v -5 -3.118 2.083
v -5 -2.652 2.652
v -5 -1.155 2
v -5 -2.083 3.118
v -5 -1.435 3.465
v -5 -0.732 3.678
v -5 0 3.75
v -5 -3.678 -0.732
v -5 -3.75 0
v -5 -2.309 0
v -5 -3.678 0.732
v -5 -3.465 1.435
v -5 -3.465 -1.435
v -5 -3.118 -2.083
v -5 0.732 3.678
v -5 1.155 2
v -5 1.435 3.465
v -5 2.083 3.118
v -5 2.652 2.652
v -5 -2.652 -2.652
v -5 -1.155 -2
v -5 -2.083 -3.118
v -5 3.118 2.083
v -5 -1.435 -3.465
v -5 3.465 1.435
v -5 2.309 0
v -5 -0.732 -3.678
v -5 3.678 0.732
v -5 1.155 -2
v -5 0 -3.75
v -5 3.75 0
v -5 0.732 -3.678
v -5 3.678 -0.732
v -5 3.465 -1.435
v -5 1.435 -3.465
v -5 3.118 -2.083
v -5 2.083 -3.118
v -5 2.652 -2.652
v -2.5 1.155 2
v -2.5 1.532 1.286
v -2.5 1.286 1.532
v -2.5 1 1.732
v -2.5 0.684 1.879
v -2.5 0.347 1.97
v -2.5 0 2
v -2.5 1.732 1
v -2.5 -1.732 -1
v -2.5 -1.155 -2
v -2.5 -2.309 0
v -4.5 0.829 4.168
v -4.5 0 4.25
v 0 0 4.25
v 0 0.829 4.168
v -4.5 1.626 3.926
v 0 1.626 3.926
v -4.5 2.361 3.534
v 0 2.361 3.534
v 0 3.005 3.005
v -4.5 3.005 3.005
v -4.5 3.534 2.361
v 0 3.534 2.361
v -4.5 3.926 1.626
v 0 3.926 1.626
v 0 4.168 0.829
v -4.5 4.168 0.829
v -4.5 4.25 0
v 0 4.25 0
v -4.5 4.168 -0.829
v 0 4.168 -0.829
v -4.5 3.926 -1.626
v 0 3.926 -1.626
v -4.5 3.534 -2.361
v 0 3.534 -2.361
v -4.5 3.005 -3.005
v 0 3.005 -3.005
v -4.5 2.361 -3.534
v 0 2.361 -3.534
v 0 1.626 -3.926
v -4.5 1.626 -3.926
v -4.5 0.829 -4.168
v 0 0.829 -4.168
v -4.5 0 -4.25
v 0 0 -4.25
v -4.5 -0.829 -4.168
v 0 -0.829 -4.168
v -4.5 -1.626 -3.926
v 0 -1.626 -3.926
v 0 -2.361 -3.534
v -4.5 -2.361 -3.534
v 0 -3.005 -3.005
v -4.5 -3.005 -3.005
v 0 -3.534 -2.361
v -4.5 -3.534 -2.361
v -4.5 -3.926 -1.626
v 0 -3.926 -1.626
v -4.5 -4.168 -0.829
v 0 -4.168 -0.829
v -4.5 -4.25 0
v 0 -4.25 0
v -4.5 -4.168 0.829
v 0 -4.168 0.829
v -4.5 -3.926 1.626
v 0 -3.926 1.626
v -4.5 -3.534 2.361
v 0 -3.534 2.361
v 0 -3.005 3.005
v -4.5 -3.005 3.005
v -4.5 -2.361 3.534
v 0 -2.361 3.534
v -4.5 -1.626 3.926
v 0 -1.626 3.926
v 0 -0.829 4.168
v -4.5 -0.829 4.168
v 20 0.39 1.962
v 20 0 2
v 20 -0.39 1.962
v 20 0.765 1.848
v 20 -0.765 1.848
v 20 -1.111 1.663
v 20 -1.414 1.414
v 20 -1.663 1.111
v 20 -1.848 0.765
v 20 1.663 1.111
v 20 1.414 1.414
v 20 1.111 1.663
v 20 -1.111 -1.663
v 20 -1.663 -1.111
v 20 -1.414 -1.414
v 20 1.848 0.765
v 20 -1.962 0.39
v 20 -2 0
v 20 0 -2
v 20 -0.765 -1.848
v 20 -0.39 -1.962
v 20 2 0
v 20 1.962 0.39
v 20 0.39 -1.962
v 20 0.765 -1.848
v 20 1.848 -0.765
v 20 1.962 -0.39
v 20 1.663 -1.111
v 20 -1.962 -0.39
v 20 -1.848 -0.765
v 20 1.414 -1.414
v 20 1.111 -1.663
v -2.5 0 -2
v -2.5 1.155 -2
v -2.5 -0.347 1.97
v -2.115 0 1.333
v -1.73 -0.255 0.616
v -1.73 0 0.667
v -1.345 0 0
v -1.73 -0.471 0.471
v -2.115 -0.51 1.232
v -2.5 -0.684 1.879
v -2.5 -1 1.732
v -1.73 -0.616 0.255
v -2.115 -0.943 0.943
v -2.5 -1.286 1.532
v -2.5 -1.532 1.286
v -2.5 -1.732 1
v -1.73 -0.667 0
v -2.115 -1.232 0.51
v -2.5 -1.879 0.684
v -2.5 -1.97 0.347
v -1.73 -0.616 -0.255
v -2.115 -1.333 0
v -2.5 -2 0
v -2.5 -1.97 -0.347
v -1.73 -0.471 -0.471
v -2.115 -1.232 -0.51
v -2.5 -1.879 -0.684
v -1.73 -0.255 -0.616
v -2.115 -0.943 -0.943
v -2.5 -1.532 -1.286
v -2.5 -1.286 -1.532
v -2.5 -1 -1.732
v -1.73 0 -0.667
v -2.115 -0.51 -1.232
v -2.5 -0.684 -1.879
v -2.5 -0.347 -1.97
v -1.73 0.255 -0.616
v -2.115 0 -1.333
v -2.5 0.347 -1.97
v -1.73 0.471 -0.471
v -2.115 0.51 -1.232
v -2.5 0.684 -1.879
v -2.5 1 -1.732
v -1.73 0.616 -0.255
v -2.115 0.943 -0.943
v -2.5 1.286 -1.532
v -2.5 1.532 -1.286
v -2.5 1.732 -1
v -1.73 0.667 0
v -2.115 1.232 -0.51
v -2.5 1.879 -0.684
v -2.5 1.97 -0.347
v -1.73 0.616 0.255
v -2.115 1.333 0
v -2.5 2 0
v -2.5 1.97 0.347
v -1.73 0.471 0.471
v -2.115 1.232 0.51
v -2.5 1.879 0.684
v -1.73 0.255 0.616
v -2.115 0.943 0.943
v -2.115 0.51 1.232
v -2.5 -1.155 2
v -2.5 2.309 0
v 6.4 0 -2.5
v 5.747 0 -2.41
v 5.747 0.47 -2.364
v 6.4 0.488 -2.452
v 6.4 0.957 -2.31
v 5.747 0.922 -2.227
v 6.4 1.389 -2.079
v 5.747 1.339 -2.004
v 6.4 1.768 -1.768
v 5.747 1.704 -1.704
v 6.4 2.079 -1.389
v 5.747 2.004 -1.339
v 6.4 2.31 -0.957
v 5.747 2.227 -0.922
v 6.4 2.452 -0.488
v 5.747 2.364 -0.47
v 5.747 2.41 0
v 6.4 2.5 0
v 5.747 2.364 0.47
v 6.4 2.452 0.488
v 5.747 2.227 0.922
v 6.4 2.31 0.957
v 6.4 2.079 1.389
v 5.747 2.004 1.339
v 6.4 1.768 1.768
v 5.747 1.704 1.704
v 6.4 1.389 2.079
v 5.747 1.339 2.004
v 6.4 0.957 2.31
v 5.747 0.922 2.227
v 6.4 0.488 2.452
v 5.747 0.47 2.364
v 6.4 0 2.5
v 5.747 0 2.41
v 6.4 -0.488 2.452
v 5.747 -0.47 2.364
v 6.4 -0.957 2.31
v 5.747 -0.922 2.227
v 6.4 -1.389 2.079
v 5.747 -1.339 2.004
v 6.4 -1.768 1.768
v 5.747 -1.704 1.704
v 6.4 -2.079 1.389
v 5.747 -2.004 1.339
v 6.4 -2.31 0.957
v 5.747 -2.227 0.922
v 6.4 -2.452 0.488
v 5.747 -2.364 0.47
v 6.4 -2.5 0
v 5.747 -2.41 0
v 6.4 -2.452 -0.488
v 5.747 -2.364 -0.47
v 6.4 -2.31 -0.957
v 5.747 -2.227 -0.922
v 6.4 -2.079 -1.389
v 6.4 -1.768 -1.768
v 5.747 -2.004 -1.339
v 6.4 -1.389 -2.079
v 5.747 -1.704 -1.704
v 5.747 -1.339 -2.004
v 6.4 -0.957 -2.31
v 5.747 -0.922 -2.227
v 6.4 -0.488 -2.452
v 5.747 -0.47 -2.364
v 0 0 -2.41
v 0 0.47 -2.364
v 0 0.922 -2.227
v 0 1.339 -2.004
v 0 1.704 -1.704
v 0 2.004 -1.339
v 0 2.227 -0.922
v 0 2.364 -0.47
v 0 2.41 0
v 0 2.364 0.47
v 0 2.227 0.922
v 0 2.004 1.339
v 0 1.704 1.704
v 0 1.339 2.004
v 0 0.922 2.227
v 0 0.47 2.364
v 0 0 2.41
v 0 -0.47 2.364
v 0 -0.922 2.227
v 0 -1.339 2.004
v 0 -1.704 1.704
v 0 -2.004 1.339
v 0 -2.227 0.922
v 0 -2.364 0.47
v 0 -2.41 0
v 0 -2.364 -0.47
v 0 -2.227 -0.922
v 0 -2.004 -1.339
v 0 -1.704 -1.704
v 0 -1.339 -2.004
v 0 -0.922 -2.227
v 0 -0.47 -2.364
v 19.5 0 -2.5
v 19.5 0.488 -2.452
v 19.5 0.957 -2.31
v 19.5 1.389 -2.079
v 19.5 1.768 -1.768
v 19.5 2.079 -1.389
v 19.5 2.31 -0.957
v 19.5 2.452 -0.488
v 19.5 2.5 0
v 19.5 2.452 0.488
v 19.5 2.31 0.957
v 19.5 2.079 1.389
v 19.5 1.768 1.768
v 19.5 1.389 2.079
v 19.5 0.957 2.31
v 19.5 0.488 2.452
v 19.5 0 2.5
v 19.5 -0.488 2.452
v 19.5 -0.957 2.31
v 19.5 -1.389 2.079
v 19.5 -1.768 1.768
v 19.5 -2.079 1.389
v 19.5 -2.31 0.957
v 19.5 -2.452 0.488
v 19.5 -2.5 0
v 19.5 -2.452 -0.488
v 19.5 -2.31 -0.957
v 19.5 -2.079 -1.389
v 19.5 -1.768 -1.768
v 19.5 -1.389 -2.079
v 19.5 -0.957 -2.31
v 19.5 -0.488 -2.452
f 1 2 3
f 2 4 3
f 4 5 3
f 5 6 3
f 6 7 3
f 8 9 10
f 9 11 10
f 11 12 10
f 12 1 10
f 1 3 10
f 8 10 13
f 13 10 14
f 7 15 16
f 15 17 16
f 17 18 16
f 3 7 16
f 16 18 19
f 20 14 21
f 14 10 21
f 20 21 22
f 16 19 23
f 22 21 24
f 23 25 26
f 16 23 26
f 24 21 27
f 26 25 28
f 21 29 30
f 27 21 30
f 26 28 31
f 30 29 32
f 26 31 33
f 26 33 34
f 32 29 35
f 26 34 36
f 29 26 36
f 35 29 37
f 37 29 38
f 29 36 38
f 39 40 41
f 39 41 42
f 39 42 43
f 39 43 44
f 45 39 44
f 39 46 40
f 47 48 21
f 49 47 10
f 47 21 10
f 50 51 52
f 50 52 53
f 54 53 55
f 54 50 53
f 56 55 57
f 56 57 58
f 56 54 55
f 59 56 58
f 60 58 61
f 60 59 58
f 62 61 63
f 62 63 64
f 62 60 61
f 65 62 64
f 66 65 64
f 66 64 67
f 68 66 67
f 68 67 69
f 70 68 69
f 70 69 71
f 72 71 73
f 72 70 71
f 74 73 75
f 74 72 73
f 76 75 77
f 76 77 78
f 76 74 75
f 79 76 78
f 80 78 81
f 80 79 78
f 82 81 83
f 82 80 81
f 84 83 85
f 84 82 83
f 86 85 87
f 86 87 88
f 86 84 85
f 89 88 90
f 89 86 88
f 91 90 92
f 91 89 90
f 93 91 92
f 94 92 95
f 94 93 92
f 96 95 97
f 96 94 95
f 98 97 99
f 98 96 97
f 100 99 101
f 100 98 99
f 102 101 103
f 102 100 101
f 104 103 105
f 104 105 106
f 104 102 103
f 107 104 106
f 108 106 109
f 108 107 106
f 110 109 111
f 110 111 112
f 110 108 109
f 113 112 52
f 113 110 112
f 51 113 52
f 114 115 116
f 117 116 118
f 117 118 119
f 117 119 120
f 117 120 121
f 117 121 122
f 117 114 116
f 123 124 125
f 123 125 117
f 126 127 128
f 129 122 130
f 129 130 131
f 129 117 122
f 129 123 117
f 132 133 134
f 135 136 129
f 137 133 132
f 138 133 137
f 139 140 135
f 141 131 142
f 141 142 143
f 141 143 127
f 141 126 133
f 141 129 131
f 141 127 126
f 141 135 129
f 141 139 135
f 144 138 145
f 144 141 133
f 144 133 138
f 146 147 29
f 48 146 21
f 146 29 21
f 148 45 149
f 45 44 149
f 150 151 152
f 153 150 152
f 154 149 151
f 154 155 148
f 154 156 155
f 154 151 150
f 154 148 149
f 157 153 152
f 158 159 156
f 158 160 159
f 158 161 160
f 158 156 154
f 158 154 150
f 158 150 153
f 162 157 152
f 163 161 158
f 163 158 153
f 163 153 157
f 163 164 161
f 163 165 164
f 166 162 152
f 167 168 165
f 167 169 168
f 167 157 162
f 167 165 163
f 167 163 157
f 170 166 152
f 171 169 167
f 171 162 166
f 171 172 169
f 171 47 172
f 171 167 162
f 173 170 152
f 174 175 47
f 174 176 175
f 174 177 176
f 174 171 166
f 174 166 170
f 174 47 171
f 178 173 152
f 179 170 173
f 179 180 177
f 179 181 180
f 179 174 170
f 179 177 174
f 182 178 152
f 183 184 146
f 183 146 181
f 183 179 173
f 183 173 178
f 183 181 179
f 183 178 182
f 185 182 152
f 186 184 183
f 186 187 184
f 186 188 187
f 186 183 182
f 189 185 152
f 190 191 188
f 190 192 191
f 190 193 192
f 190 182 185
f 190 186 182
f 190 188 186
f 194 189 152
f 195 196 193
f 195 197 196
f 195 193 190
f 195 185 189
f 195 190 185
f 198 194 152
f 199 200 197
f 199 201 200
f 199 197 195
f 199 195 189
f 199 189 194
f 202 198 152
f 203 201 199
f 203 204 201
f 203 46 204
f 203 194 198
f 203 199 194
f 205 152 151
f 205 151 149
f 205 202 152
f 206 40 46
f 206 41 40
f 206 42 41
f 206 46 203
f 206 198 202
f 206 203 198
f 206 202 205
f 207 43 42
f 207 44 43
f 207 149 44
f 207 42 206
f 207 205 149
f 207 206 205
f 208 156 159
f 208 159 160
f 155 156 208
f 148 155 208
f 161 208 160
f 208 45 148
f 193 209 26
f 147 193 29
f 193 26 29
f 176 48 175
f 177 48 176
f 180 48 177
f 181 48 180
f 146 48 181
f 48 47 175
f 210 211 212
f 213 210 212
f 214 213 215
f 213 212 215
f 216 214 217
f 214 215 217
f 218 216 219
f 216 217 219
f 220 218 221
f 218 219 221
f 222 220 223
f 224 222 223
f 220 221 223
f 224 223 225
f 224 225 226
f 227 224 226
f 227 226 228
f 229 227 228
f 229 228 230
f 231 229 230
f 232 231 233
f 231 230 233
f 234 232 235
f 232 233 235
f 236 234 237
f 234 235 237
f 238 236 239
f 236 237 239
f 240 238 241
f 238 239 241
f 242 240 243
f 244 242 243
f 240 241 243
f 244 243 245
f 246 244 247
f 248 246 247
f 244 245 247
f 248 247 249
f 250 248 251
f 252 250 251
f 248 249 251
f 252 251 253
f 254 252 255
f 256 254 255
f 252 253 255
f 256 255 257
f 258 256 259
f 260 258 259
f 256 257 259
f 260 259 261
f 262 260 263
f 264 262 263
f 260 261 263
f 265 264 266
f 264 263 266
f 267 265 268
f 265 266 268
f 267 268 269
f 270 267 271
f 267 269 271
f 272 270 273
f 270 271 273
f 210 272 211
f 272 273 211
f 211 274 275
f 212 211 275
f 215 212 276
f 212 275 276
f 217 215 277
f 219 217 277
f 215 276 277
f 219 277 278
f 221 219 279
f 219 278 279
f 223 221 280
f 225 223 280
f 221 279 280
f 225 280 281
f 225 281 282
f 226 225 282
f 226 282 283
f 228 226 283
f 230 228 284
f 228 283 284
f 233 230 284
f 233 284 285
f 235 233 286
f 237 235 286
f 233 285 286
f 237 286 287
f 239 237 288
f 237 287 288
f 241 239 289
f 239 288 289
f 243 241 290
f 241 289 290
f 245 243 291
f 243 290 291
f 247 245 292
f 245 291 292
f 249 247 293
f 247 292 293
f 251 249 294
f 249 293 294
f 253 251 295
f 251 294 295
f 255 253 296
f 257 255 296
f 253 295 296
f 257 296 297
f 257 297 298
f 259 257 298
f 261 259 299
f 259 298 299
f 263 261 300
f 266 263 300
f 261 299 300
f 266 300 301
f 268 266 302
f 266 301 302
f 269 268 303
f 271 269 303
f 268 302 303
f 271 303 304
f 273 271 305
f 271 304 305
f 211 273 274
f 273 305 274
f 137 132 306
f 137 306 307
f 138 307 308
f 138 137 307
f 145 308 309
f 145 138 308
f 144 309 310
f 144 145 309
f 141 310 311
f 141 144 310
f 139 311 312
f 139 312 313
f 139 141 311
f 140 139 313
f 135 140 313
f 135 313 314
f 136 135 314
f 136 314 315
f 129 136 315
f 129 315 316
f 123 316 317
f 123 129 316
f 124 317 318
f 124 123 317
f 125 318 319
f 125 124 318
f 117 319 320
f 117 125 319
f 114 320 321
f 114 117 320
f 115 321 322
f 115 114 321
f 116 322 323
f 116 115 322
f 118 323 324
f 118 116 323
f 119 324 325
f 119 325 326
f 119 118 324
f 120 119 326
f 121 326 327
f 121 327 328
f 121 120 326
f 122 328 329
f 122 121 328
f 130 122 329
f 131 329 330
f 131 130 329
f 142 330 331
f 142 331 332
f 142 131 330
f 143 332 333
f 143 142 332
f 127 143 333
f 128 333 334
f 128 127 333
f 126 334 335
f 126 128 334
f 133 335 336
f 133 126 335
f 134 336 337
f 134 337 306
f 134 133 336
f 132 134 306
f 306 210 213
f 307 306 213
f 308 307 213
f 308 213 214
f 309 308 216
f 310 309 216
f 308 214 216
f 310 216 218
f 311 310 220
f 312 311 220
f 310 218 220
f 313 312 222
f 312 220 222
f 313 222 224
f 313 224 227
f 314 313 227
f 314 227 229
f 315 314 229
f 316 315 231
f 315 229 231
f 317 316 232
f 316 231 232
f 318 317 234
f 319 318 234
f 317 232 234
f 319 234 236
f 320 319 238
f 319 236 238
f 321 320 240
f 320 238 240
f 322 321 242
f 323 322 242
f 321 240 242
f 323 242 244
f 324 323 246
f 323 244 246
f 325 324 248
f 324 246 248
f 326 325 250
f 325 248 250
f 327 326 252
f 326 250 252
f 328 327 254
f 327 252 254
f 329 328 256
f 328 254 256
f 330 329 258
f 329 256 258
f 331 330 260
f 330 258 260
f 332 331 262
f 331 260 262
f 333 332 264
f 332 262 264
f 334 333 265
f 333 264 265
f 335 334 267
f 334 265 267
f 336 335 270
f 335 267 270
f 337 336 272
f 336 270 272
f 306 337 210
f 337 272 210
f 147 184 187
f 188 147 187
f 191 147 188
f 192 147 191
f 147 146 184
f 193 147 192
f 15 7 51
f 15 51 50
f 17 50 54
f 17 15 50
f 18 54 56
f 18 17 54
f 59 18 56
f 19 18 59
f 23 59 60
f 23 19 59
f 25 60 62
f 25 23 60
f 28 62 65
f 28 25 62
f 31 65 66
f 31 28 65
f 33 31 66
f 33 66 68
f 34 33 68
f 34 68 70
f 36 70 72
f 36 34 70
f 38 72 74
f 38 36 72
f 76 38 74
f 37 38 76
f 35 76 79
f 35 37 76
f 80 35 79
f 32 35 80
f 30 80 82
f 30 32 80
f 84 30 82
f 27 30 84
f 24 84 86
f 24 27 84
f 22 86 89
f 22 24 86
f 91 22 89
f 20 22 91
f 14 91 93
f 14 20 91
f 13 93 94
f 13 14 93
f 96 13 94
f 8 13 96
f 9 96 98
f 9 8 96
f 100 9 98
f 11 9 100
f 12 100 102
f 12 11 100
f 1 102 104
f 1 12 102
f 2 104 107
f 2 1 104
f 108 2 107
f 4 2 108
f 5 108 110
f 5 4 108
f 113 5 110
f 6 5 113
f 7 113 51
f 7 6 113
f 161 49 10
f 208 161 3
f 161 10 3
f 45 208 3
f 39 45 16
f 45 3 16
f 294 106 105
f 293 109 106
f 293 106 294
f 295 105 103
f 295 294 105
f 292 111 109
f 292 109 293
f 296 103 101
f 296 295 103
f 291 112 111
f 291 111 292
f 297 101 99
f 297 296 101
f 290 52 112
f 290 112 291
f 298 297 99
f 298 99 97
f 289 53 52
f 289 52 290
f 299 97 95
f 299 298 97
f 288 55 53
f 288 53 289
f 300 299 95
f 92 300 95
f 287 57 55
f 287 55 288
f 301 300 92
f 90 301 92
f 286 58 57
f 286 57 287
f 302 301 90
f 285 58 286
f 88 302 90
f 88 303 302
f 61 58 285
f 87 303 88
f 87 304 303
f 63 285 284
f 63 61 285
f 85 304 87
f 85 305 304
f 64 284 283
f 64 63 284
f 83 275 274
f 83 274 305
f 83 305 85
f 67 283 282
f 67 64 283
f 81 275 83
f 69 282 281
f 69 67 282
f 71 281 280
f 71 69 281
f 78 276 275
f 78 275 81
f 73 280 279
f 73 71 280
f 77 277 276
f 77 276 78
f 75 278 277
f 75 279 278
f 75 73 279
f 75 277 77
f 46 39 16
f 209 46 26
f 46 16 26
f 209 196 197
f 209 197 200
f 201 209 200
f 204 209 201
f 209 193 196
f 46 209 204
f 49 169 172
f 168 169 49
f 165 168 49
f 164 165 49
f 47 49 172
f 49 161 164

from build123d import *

# Parameters (mm, degrees)
SKETCH1_W           = 5
SKETCH1_H           = 4.25
SKETCH2_R           = 2.41
BOSS_EXTRUDE1_DEPTH = 5.746788991
SKETCH3_R           = 2.41
BOSS_EXTRUDE2_DEPTH = 0.653211009
BOSS_EXTRUDE2_DRAFT = -7.844871593
SKETCH4_R           = 2.5
BOSS_EXTRUDE3_DEPTH = 13.6
CUT_EXTRUDE1_DEPTH  = 2.5
CHAMFER1_SIZE       = 0.5


with BuildPart() as part:
    # Sketch1 → Revolve1 (revolve)
    with BuildSketch(Plane(origin=(0, 0, 0), x_dir=(-1, 0, 0), z_dir=(0, 0, -1)), mode=Mode.PRIVATE) as revolve1_sk:
        with Locations((2.5, 2.125)):
            Rectangle(SKETCH1_W, SKETCH1_H)
    revolve(revolve1_sk.sketch.rotate(Axis((0, 0, 0), (-1, 0, 0)), 270), axis=Axis((0, 0, 0), (-1, 0, 0)))

    # Sketch2 → Boss-Extrude1 (add)
    with BuildSketch(Plane(origin=(0, 0, 0), x_dir=(0, 0, -1), z_dir=(1, 0, 0))):
        Circle(SKETCH2_R)
    extrude(amount=BOSS_EXTRUDE1_DEPTH)


with BuildPart() as boss_extrude2_tool:
    # Sketch3 → Boss-Extrude2 (with draft: the straight prism first)
    with BuildSketch(Plane(origin=(5.746788991, 0, 0), x_dir=(0, 0, -1), z_dir=(1, 0, 0))):
        Circle(SKETCH3_R)
    extrude(amount=BOSS_EXTRUDE2_DEPTH)
    # Boss-Extrude2: the draft: its side faces are tilted about the plane it starts from
    boss_extrude2_sides = [boss_extrude2_tool.faces().sort_by_distance(p)[0] for p in [
        (6.073394495, 0, 2.41),
    ]]
    draft(boss_extrude2_sides, Plane(origin=(5.746788991, 0, 0), x_dir=(0, 0, -1), z_dir=(1, 0, 0)), BOSS_EXTRUDE2_DRAFT)


with BuildPart() as part_1:
    add(part.part)

    # Boss-Extrude2: add boss_extrude2_tool
    add(boss_extrude2_tool.part)

    # Sketch4 → Boss-Extrude3 (add)
    with BuildSketch(Plane(origin=(6.4, 0, 0), x_dir=(0, 0, -1), z_dir=(1, 0, 0))):
        Circle(SKETCH4_R)
    extrude(amount=BOSS_EXTRUDE3_DEPTH)

    # Sketch5 → Cut-Extrude1 (cut)
    with BuildSketch(Plane.ZY.offset(5)):
        Polygon((-2, -1.154700538), (0, -2.309401077), (2, -1.154700538), (2, 1.154700538), (0, 2.309401077), (-2, 1.154700538), align=None)
    extrude(amount=-CUT_EXTRUDE1_DEPTH, mode=Mode.SUBTRACT)

    # Sketch6 → Cut-Revolve1 (revolve, cut)
    with BuildSketch(Plane.XY, mode=Mode.PRIVATE) as cut_revolve1_sk:
        Polygon((-2.5, 2), (-2.5, 0), (-1.345299462, 0), align=None)
    revolve(cut_revolve1_sk.sketch.rotate(Axis((-2.500025, 0, 0), (1, 0, 0)), 90), axis=Axis((-2.500025, 0, 0), (1, 0, 0)), mode=Mode.SUBTRACT)

    # Chamfer1
    chamfer1_edges = [part_1.edges().sort_by_distance(p)[0] for p in [
        (20, 0, 2.5),
        (-5, 0, -4.25),
    ]]
    chamfer(chamfer1_edges, length=CHAMFER1_SIZE)


solid = part_1.part
